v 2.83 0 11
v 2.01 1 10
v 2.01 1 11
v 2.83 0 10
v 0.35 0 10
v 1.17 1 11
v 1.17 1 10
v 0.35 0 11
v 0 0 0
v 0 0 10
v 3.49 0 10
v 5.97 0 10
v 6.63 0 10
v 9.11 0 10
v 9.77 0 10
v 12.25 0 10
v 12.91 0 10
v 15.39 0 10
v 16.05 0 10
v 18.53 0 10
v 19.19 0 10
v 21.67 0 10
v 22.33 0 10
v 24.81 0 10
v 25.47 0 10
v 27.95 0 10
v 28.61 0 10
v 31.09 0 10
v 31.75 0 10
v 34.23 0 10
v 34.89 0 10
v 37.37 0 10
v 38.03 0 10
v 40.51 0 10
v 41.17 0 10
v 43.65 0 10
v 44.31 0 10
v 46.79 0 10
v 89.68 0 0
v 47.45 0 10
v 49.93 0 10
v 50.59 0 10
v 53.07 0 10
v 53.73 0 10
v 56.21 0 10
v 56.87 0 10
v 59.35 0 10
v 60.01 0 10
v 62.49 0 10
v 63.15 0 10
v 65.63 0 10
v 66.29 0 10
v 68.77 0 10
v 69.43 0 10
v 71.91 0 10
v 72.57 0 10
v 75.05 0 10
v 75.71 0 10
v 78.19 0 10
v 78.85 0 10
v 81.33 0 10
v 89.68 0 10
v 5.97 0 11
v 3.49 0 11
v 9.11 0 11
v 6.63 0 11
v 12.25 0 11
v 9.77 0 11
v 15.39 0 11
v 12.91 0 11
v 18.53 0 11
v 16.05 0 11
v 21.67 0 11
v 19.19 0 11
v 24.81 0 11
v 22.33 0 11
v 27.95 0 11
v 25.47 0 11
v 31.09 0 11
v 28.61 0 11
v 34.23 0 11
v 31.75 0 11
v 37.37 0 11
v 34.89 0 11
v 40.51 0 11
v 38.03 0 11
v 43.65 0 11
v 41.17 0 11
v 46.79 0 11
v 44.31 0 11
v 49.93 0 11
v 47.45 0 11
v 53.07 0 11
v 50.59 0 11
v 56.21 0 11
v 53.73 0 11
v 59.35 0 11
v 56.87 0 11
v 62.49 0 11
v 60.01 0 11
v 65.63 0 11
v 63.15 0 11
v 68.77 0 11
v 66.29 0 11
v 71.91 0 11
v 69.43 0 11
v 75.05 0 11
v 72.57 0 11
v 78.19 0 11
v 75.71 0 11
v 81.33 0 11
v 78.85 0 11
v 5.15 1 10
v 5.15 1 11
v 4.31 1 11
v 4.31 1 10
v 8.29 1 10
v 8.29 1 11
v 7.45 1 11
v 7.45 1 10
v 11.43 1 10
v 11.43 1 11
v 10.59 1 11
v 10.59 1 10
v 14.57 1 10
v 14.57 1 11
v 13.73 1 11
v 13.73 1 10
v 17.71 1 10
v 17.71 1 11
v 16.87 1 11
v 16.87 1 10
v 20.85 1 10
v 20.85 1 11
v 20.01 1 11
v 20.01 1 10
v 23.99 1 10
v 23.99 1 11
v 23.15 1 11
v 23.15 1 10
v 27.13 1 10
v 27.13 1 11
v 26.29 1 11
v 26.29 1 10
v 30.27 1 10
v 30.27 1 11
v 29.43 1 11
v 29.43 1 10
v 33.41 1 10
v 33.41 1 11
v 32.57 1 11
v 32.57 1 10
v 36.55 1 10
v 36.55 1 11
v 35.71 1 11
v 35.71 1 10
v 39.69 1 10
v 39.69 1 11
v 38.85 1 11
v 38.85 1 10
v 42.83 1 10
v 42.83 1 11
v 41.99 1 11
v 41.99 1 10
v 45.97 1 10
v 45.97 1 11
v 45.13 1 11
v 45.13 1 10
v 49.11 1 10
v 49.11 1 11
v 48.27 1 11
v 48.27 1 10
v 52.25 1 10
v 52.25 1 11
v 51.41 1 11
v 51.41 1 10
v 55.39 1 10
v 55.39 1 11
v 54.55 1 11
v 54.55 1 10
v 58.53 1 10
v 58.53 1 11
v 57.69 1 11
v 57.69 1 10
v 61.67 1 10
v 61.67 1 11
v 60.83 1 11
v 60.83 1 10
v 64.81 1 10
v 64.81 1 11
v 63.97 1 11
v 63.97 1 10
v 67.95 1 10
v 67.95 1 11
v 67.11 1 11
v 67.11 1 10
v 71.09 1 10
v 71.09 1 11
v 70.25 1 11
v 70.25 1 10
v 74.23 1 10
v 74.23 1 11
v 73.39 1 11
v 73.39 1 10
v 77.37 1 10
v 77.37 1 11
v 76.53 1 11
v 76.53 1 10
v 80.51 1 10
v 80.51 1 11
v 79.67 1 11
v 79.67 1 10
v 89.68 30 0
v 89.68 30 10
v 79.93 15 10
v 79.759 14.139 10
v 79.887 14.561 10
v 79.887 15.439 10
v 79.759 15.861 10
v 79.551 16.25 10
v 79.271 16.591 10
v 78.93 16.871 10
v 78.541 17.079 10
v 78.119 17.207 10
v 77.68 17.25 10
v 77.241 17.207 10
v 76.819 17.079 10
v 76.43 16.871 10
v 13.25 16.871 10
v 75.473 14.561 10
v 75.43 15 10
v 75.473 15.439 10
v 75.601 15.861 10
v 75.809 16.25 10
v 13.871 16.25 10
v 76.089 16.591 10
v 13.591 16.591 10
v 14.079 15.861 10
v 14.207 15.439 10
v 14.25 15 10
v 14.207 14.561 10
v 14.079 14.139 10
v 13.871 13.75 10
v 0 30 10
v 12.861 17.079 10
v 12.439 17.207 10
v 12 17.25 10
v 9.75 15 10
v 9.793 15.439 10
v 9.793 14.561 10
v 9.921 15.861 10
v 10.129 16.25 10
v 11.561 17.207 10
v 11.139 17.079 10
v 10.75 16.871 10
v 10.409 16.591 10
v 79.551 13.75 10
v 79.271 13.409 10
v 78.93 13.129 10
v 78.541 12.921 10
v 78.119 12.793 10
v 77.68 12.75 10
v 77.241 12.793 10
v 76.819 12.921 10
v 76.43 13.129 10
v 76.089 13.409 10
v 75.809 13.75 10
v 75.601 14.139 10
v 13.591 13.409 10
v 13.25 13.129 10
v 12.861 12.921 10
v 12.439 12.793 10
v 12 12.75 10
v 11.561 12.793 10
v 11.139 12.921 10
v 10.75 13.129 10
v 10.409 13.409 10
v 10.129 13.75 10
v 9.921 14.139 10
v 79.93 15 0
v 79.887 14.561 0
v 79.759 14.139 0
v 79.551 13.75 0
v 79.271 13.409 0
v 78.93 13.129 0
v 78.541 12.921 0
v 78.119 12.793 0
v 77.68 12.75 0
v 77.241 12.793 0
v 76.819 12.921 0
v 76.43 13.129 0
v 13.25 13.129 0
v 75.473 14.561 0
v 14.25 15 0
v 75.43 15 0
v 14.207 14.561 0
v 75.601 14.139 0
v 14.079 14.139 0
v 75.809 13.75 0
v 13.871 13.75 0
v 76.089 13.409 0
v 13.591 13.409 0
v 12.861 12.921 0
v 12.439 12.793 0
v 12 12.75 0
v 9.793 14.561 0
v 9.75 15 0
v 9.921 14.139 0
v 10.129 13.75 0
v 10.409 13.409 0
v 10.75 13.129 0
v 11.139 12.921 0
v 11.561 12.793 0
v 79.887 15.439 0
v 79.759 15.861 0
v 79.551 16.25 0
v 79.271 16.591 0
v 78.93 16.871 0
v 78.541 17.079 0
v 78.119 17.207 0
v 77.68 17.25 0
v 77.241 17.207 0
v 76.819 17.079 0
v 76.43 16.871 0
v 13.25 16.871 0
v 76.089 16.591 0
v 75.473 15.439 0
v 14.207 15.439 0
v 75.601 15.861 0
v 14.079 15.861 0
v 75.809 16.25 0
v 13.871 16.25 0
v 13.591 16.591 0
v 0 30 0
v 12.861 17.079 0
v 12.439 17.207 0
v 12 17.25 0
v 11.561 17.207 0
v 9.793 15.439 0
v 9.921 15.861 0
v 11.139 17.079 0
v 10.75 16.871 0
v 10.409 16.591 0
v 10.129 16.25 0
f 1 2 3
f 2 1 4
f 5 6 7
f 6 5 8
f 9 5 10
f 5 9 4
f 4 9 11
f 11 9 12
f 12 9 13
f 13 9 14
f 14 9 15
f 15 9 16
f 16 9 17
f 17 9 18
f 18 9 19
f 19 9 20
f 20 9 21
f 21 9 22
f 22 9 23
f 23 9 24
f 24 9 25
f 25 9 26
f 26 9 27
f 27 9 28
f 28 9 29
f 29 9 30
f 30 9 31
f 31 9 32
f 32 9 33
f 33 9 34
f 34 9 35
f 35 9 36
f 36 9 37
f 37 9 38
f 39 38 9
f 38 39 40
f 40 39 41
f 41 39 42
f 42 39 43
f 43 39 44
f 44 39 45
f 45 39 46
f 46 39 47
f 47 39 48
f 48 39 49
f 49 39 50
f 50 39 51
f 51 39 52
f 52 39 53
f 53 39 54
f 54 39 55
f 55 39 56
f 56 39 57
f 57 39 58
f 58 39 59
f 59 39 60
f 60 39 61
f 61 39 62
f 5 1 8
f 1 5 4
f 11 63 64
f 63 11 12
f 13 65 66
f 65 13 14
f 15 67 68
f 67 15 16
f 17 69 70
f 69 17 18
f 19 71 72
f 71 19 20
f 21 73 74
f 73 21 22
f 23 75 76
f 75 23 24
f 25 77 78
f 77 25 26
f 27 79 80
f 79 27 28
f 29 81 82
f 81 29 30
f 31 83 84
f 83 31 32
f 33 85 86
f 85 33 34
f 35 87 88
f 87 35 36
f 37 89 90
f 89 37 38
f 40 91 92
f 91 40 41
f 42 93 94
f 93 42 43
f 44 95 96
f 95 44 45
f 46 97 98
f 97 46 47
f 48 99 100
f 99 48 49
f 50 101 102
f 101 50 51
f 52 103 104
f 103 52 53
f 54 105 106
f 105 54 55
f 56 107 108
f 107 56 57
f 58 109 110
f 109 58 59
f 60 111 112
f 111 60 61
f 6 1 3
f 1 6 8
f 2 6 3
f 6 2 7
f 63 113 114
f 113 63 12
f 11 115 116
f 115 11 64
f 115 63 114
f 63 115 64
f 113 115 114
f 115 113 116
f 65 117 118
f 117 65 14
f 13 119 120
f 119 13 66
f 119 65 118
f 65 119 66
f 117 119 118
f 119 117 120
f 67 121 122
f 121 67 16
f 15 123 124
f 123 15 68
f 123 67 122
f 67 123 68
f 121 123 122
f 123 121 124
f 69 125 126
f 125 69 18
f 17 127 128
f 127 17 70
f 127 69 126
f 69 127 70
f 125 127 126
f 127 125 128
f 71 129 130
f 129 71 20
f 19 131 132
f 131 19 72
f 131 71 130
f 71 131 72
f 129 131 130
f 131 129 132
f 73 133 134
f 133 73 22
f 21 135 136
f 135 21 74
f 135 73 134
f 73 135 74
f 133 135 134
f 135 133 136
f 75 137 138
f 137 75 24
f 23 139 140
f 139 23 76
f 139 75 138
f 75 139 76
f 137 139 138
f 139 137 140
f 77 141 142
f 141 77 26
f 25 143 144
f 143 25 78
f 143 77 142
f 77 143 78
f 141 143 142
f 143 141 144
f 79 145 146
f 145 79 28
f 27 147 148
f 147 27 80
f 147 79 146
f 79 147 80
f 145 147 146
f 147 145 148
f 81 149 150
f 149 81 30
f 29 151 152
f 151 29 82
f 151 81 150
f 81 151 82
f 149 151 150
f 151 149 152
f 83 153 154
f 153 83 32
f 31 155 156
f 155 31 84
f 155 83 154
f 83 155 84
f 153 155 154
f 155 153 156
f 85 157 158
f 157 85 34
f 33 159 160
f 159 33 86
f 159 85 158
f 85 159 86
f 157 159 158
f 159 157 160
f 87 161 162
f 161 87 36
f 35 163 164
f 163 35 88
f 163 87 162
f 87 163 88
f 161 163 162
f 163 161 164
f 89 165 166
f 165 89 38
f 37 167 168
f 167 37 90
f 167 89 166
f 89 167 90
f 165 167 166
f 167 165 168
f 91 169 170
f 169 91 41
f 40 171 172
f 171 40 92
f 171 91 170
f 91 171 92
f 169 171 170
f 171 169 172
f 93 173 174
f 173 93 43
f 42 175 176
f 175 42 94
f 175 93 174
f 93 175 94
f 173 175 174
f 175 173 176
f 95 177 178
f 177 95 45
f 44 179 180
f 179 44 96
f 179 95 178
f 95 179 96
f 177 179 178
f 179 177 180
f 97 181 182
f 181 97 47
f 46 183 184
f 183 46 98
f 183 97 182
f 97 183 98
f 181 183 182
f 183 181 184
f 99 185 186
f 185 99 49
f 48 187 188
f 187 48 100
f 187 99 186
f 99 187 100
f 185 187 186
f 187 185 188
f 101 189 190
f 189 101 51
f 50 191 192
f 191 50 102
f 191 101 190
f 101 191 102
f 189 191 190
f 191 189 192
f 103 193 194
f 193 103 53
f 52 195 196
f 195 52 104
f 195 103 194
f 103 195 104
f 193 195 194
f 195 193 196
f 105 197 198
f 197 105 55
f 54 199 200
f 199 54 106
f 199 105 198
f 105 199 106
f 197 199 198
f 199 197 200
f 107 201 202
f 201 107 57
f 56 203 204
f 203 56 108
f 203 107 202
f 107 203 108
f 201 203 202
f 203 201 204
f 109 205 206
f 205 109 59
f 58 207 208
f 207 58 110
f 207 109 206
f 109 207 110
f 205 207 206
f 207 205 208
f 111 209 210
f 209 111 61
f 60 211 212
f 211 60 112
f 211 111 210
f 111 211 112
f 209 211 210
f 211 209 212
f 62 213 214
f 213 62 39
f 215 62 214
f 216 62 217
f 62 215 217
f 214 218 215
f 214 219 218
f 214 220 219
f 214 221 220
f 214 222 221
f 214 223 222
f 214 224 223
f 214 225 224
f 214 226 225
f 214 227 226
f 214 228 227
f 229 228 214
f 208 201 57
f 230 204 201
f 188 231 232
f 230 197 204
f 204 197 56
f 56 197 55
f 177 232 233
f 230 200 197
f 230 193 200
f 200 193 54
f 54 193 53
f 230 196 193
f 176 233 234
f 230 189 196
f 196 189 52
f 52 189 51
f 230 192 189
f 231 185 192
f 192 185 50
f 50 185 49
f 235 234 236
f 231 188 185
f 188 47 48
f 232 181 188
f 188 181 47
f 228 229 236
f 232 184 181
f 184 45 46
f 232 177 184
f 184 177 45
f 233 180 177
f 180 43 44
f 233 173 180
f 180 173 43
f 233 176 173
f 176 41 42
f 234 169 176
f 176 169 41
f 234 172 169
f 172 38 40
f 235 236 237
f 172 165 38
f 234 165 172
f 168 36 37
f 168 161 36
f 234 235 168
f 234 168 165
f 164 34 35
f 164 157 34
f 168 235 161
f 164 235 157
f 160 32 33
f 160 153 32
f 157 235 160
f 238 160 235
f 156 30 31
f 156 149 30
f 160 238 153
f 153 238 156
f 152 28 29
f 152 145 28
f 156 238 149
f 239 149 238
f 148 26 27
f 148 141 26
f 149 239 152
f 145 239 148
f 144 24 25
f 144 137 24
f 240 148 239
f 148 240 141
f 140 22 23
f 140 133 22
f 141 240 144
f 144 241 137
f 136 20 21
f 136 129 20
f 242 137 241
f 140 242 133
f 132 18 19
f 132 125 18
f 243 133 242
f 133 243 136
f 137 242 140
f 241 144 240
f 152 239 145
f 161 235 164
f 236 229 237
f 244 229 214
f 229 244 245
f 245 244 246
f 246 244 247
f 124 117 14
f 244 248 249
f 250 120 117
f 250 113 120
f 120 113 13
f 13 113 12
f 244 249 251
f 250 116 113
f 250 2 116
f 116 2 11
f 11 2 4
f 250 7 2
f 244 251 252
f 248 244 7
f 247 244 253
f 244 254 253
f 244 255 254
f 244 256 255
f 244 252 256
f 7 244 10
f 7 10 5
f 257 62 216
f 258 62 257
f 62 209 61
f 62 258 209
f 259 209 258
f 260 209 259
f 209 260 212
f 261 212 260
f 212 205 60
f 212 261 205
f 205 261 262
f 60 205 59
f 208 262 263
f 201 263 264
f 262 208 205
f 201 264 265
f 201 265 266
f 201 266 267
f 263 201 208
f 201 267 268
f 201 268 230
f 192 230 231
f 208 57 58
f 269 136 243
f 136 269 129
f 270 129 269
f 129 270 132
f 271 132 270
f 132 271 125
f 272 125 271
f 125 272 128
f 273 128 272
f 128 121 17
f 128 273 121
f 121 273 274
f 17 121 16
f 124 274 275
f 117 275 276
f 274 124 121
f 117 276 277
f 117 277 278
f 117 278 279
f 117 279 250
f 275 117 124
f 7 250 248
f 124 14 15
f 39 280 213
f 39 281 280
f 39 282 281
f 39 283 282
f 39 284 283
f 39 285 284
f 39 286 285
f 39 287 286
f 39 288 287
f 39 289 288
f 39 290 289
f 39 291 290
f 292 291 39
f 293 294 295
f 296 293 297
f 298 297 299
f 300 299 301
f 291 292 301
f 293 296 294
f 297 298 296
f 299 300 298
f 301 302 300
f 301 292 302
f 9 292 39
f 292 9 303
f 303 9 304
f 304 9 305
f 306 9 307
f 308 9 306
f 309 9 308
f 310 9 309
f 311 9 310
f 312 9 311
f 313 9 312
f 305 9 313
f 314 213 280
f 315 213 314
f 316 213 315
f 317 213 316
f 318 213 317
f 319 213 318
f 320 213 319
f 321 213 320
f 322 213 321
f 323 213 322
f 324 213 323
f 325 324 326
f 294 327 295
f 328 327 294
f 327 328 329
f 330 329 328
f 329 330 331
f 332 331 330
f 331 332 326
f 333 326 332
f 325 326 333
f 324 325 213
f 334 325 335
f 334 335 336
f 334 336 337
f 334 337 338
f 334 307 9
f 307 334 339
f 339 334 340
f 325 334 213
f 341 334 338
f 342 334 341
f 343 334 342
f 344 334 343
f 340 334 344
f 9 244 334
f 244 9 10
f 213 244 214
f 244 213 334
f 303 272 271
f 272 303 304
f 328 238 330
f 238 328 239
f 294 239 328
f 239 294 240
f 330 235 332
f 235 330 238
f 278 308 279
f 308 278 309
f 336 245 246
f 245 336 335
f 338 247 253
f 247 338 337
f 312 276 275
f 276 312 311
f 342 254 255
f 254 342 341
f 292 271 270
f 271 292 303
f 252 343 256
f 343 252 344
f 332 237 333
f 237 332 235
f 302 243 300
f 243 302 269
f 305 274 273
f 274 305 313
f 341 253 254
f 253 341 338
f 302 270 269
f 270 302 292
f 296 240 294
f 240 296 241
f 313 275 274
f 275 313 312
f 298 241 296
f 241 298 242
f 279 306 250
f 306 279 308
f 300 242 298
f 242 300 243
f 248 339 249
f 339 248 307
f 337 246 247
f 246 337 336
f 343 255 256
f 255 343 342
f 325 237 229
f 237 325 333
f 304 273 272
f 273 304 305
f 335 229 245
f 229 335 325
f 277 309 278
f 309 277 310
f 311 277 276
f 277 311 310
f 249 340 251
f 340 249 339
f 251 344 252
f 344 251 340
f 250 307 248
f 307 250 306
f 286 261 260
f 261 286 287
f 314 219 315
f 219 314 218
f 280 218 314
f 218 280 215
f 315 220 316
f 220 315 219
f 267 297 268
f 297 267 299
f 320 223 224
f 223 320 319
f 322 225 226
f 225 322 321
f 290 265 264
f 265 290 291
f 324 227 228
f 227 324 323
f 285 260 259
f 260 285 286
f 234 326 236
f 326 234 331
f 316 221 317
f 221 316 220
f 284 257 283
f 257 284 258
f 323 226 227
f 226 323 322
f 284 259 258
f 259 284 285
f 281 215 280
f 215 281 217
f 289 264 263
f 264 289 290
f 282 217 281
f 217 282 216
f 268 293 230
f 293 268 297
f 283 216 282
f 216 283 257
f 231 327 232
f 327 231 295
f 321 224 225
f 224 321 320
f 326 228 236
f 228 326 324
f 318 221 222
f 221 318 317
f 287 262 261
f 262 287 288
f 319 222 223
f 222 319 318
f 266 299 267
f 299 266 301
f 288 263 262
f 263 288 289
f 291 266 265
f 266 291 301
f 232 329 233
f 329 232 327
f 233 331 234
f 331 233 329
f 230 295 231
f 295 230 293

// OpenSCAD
$fn = 32;

// ----------------------------------------------------------------------
// Gear rack: m=1 z=26, 89.68 x 30 x 11 mm
// ----------------------------------------------------------------------

// --- parameters (mm) ---
rack_len = 89.68;         // rack length, X
rack_w = 30;              // rack width, Y
rack_h = 11;              // overall height, Z
modul = 1;                // module
body_t = 10;              // tooth root line height
pitch = 3.14;             // circular pitch
tip_w = 0.84;             // tooth thickness at the tip
root_w = 2.48;            // tooth thickness at the root line
hole_d = 4.5;             // mounting hole
sink = 0.6;               // tooth root overlap into the body

tooth_span = 81.68;

module tooth(x0) {
  /* 20 deg flank profile, sunk into the body for a positive overlap */
  translate([x0, 0, body_t - sink])
    linear_extrude(height = rack_h - body_t + sink)
      polygon(points = [[-root_w / 2, 0], [root_w / 2, 0],
                        [tip_w / 2, rack_h - body_t],
                        [-tip_w / 2, rack_h - body_t]]);
}

difference() {
  union() {
    cube([rack_len, rack_w, body_t]);
    for (i = [0 : 26 - 1])
      tooth((i + 0.5) * pitch + (tooth_span - 26 * pitch) / 2);
  }
  translate([12, 15, -1]) cylinder(h = body_t + 2, d = hole_d);
  translate([77.68, 15, -1]) cylinder(h = body_t + 2, d = hole_d);
}
